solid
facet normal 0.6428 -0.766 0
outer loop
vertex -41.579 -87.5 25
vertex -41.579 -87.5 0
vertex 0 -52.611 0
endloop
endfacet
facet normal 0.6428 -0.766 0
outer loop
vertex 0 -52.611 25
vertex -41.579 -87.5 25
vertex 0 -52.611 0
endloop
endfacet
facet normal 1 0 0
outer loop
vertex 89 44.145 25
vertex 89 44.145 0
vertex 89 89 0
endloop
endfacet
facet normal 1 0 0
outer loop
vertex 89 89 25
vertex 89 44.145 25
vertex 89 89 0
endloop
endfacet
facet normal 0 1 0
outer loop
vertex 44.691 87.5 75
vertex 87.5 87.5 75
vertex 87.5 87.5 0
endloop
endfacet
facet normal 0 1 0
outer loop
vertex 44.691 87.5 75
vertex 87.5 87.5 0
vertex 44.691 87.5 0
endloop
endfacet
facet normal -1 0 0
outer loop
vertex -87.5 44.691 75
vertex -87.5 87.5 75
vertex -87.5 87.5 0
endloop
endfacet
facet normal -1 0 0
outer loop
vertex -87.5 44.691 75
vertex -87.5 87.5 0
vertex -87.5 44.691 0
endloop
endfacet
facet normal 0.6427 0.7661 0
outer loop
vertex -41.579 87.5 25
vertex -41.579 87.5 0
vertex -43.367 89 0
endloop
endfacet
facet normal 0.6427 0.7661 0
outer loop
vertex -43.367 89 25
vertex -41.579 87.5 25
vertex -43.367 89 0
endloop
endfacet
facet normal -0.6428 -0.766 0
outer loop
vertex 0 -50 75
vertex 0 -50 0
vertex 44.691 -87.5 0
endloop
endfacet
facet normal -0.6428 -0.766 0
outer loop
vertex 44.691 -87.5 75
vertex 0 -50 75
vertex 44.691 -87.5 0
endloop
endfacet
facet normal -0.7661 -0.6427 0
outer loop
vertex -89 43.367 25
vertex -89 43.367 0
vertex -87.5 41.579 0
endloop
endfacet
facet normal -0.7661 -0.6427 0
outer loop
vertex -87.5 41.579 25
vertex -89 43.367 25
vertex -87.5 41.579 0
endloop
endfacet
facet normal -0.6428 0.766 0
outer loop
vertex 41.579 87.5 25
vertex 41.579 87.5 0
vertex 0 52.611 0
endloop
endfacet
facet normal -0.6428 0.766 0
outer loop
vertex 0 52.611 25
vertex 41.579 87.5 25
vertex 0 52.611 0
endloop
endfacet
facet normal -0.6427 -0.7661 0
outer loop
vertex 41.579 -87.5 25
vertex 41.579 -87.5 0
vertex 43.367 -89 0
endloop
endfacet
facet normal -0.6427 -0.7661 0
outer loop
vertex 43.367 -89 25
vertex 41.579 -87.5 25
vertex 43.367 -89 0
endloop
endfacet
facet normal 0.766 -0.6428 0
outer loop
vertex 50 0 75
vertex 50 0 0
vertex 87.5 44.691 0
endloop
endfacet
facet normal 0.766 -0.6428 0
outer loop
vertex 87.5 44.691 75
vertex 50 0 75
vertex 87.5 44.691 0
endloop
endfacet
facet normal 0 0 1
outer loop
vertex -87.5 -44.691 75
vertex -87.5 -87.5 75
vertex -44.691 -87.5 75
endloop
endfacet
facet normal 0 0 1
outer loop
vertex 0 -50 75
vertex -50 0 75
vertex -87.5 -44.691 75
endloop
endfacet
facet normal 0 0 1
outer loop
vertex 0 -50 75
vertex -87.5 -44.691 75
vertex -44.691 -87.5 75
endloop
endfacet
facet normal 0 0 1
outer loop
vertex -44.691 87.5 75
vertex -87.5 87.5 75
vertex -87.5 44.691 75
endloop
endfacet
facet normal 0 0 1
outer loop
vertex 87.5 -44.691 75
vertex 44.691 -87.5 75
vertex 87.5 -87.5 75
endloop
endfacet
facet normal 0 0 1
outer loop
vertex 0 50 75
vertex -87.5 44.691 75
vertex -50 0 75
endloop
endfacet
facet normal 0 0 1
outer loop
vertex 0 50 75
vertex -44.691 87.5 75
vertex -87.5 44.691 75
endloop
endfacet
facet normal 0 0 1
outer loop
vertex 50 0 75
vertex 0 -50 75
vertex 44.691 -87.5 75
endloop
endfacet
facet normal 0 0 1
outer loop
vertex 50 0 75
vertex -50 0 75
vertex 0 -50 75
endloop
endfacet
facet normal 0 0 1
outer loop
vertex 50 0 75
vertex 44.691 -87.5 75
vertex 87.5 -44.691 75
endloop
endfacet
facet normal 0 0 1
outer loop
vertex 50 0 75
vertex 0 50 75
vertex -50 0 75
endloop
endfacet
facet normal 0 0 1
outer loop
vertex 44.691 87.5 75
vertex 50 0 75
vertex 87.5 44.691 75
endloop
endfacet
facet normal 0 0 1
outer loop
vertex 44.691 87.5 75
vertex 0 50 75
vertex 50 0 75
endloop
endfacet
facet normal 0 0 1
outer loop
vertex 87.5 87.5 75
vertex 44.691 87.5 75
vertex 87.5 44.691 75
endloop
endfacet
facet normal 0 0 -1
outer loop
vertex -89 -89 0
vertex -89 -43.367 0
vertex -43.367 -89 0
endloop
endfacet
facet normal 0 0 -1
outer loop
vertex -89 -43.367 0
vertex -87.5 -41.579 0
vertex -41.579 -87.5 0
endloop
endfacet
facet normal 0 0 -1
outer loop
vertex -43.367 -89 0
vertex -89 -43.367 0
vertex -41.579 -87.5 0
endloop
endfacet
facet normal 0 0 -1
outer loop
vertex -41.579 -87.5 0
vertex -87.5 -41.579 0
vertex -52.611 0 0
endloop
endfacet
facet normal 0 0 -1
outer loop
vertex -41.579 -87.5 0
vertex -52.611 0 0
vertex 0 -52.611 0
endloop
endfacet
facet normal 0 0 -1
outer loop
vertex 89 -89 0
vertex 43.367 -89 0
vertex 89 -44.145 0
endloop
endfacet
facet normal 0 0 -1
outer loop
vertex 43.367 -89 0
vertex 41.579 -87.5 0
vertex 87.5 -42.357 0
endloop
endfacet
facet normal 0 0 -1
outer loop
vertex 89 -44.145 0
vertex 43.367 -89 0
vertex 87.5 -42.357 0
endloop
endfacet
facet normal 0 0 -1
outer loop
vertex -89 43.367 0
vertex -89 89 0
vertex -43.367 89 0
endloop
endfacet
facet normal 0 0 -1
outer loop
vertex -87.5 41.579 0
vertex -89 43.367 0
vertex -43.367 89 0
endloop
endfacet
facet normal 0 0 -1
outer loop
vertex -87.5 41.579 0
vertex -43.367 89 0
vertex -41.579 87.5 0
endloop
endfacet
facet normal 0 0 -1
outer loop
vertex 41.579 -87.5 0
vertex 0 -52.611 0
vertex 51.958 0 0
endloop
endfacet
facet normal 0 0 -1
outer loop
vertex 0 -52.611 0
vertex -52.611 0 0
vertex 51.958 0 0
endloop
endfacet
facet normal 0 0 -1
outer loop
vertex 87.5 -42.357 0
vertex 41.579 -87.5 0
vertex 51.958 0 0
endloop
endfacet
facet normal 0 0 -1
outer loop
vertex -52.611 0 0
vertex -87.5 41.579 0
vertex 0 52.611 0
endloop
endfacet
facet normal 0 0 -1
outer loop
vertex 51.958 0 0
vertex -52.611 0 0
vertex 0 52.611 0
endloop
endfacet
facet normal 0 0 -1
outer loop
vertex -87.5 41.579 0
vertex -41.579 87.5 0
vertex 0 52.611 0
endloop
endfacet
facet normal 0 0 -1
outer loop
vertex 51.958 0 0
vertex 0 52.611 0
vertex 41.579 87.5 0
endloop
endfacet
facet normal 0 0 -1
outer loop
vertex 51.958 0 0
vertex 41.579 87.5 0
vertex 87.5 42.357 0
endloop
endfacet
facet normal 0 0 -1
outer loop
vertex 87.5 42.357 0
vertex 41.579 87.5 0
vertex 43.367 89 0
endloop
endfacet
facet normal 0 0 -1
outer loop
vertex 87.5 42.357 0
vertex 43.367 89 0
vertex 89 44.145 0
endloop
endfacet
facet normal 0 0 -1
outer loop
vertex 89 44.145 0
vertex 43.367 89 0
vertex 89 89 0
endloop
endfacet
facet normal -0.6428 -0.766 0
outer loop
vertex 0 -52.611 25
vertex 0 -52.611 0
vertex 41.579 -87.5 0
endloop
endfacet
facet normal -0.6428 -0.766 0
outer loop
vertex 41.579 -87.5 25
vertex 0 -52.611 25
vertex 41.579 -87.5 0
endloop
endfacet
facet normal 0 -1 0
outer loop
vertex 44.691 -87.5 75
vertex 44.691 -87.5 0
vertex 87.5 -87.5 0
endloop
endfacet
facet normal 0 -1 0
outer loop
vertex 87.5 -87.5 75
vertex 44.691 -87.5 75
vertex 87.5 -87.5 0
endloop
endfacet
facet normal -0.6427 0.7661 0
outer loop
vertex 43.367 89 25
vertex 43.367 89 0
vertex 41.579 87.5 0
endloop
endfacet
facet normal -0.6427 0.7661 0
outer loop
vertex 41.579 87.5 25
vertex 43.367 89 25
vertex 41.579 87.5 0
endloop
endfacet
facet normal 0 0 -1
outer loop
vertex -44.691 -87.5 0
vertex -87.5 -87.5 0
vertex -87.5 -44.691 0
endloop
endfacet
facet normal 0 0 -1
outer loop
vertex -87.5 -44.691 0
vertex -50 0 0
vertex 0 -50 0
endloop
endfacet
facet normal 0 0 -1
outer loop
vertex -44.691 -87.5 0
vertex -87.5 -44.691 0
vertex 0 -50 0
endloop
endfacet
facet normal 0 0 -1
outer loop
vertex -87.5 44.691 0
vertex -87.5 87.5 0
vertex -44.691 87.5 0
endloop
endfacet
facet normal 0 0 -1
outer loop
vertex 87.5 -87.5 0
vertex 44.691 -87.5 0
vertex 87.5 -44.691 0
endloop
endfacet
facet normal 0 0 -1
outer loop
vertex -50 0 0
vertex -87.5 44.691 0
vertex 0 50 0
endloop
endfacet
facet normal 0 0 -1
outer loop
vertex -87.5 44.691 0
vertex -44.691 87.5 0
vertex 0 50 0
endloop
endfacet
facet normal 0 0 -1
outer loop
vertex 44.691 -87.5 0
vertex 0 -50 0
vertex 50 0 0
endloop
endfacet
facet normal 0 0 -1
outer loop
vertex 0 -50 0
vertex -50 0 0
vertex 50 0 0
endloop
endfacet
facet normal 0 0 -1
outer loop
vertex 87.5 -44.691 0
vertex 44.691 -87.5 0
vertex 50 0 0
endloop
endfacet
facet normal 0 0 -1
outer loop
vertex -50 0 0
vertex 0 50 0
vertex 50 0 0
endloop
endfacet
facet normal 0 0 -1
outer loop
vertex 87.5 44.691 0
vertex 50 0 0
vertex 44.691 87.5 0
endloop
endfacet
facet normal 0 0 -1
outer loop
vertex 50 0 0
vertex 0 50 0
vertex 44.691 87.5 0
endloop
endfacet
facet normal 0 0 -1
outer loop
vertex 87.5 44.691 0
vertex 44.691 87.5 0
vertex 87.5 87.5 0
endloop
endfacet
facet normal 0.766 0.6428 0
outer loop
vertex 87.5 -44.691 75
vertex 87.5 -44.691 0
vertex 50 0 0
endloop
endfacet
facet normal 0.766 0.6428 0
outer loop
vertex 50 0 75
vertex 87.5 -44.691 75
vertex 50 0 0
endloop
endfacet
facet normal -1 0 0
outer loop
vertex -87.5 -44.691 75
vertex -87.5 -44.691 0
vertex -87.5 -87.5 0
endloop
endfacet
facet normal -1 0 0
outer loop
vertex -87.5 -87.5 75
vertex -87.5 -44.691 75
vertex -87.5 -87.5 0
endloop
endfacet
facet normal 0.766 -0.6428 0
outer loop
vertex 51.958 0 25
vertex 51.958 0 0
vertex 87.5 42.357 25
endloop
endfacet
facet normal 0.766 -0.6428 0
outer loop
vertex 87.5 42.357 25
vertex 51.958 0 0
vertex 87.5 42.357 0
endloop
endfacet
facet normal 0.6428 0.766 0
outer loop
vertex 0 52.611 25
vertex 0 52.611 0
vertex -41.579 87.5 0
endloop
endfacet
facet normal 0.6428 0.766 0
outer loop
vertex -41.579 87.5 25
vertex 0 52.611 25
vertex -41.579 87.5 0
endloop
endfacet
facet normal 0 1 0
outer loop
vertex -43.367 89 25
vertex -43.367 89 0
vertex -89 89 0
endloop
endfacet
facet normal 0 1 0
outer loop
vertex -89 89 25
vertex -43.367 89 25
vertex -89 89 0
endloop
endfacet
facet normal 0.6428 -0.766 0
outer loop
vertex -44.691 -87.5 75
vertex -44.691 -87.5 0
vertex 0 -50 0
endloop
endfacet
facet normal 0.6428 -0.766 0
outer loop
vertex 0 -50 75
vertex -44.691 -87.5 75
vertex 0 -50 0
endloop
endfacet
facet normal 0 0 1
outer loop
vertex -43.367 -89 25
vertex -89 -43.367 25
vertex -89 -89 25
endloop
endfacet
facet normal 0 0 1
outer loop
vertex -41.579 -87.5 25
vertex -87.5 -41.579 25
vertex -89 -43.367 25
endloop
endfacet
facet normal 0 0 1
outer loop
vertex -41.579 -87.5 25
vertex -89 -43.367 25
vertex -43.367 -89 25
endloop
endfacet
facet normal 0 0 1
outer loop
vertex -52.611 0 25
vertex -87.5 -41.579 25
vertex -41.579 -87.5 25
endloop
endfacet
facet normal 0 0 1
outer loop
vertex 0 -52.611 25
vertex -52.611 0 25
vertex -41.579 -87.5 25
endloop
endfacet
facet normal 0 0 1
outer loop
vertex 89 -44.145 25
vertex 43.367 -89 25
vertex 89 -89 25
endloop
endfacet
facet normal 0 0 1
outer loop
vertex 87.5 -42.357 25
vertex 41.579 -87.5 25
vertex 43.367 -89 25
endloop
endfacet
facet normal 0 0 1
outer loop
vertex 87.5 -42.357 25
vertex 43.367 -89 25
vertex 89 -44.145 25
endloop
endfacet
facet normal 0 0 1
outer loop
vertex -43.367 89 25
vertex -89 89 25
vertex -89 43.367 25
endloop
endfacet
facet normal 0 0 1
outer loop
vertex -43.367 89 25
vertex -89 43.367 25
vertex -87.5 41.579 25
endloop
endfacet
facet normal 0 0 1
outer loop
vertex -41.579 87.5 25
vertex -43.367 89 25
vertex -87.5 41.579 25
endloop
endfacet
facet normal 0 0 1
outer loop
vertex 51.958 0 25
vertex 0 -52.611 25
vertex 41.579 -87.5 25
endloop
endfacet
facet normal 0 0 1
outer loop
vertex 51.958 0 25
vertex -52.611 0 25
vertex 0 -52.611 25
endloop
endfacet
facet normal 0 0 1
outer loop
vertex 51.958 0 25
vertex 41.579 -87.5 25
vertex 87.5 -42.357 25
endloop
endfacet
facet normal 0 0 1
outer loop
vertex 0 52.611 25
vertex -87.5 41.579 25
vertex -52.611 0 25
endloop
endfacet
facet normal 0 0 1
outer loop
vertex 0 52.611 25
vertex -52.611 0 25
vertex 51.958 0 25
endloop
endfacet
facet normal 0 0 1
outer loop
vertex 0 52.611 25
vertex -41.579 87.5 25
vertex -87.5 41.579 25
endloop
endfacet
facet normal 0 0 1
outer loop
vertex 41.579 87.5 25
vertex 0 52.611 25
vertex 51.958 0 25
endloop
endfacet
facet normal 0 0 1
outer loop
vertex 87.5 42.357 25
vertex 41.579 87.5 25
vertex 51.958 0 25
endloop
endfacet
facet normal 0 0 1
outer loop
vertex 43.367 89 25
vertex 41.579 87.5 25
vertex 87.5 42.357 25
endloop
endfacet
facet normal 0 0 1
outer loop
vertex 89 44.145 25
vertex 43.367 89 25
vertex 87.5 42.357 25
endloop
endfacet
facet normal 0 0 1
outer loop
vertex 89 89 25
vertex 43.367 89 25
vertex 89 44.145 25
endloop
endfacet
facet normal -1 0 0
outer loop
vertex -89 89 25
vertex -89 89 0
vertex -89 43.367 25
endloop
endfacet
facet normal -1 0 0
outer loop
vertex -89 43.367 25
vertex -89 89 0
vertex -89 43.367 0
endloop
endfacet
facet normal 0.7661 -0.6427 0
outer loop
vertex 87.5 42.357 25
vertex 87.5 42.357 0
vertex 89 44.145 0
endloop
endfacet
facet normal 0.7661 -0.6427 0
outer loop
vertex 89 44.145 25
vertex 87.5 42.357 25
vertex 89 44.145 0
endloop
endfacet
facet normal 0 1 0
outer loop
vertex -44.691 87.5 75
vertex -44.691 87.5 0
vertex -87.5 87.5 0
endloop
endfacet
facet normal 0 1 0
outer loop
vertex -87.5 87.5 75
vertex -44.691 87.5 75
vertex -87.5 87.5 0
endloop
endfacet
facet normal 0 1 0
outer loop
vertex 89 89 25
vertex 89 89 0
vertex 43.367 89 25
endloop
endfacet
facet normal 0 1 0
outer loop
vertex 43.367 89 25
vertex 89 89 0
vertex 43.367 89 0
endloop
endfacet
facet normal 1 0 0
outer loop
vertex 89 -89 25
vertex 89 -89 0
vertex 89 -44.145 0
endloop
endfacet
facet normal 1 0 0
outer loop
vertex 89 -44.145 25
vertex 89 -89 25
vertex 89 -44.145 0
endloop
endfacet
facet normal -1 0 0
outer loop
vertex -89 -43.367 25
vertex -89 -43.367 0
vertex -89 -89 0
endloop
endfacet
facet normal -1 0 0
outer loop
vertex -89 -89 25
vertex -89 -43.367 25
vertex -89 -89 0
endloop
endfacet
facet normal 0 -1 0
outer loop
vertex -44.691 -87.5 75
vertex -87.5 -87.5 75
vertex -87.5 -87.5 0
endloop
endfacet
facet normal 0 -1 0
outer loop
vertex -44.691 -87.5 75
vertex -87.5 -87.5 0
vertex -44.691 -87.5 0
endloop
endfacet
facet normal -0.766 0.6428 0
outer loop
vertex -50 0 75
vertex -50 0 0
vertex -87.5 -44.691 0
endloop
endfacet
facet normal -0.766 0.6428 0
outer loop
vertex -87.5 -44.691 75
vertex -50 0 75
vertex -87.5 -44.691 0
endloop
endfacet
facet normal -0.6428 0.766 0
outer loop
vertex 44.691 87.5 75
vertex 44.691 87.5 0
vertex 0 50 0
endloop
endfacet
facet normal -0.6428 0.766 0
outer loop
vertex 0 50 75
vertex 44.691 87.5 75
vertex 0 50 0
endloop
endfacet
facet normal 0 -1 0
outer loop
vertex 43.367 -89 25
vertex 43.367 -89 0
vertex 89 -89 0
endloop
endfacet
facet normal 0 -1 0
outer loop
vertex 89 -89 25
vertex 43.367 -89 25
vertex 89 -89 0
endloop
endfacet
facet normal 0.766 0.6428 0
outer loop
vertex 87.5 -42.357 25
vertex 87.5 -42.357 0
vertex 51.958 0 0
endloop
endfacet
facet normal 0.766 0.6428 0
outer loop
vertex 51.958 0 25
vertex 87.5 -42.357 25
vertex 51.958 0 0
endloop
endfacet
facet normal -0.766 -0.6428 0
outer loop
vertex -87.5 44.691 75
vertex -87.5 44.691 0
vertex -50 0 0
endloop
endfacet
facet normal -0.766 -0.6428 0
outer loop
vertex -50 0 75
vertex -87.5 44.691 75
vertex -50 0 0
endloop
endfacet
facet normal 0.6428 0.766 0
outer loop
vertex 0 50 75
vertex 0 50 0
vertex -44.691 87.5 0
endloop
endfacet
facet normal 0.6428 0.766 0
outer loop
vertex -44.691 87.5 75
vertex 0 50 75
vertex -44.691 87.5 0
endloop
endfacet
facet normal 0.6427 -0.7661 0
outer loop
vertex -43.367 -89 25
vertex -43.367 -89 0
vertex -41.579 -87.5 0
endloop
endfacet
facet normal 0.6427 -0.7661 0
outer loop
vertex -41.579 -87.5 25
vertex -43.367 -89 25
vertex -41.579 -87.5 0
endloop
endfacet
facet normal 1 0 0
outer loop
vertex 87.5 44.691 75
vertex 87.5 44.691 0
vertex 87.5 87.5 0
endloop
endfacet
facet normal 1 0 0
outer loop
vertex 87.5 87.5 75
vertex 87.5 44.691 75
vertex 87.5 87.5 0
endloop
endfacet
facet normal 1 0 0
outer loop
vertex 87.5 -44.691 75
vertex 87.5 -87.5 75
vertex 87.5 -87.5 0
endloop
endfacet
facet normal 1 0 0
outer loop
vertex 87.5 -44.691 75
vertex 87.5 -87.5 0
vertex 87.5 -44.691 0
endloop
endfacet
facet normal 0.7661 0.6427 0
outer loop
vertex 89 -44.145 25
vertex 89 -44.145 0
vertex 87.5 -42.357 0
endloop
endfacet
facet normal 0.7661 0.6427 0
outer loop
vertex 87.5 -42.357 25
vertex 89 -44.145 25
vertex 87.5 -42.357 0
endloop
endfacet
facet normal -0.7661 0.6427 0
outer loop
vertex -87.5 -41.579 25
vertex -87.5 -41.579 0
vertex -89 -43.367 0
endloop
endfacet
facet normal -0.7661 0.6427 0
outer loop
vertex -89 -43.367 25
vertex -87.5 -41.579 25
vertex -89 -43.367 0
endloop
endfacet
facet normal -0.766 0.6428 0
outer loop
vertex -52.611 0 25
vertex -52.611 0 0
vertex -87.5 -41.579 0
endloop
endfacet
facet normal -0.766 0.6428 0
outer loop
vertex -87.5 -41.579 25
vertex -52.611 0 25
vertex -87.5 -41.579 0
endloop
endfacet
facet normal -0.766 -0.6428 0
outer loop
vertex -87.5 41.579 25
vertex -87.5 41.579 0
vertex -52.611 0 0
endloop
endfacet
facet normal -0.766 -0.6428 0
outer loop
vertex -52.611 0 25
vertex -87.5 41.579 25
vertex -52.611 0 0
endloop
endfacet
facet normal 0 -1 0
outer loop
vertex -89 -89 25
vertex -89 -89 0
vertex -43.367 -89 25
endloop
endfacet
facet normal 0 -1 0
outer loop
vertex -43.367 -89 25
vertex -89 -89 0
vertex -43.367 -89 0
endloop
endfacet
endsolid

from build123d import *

# Parameters (mm, degrees)
F1_DEPTH = 75
F2_DEPTH = 25


with BuildPart() as f1:
    # F0 (on Top) → F1 (new body)
    with BuildSketch(Plane.XY):
        Polygon((87.5, 44.69076), (87.5, 87.5), (44.69076, 87.5), (0, 50), (-44.69076, 87.5), (-87.5, 87.5), (-87.5, 44.69076), (-50, 0), (-87.5, -44.69076), (-87.5, -87.5), (-44.69076, -87.5), (0, -50), (44.69076, -87.5), (87.5, -87.5), (87.5, -44.69076), (50, 0), align=None)
    extrude(amount=F1_DEPTH)


with BuildPart() as f2:
    # F0 (on Top) → F2 (new body)
    with BuildSketch(Plane.XY):
        Polygon((-44.69076, 87.5), (-41.579312, 87.5), (-43.366942, 89), (-89, 89), (-89, 43.366942), (-87.5, 41.579312), (-87.5, 44.69076), (-87.5, 87.5), align=None)
        Polygon((0, 50), (44.69076, 87.5), (41.579312, 87.5), (0, 52.610815), (-41.579312, 87.5), (-44.69076, 87.5), align=None)
        Polygon((-50, 0), (-87.5, 44.69076), (-87.5, 41.579312), (-52.610815, 0), (-87.5, -41.579312), (-87.5, -44.69076), align=None)
        Polygon((44.69076, 87.5), (87.5, 87.5), (87.5, 44.69076), (87.5, 42.357174), (89, 44.144804), (89, 89), (43.366942, 89), (41.579312, 87.5), align=None)
        Polygon((87.5, 42.357174), (87.5, 44.69076), (50, 0), (87.5, -44.69076), (87.5, -42.357174), (51.958111, 0), align=None)
        Polygon((87.5, 44.69076), (87.5, 87.5), (44.69076, 87.5), (0, 50), (-44.69076, 87.5), (-87.5, 87.5), (-87.5, 44.69076), (-50, 0), (-87.5, -44.69076), (-87.5, -87.5), (-44.69076, -87.5), (0, -50), (44.69076, -87.5), (87.5, -87.5), (87.5, -44.69076), (50, 0), align=None)
        Polygon((-87.5, -41.579312), (-89, -43.366942), (-89, -89), (-43.366942, -89), (-41.579312, -87.5), (-44.69076, -87.5), (-87.5, -87.5), (-87.5, -44.69076), align=None)
        Polygon((89, -44.144804), (87.5, -42.357174), (87.5, -44.69076), (87.5, -87.5), (44.69076, -87.5), (41.579312, -87.5), (43.366942, -89), (89, -89), align=None)
        Polygon((41.579312, -87.5), (44.69076, -87.5), (0, -50), (-44.69076, -87.5), (-41.579312, -87.5), (0, -52.610815), align=None)
    extrude(amount=F2_DEPTH)


solid = Compound([f1.part, f2.part])
